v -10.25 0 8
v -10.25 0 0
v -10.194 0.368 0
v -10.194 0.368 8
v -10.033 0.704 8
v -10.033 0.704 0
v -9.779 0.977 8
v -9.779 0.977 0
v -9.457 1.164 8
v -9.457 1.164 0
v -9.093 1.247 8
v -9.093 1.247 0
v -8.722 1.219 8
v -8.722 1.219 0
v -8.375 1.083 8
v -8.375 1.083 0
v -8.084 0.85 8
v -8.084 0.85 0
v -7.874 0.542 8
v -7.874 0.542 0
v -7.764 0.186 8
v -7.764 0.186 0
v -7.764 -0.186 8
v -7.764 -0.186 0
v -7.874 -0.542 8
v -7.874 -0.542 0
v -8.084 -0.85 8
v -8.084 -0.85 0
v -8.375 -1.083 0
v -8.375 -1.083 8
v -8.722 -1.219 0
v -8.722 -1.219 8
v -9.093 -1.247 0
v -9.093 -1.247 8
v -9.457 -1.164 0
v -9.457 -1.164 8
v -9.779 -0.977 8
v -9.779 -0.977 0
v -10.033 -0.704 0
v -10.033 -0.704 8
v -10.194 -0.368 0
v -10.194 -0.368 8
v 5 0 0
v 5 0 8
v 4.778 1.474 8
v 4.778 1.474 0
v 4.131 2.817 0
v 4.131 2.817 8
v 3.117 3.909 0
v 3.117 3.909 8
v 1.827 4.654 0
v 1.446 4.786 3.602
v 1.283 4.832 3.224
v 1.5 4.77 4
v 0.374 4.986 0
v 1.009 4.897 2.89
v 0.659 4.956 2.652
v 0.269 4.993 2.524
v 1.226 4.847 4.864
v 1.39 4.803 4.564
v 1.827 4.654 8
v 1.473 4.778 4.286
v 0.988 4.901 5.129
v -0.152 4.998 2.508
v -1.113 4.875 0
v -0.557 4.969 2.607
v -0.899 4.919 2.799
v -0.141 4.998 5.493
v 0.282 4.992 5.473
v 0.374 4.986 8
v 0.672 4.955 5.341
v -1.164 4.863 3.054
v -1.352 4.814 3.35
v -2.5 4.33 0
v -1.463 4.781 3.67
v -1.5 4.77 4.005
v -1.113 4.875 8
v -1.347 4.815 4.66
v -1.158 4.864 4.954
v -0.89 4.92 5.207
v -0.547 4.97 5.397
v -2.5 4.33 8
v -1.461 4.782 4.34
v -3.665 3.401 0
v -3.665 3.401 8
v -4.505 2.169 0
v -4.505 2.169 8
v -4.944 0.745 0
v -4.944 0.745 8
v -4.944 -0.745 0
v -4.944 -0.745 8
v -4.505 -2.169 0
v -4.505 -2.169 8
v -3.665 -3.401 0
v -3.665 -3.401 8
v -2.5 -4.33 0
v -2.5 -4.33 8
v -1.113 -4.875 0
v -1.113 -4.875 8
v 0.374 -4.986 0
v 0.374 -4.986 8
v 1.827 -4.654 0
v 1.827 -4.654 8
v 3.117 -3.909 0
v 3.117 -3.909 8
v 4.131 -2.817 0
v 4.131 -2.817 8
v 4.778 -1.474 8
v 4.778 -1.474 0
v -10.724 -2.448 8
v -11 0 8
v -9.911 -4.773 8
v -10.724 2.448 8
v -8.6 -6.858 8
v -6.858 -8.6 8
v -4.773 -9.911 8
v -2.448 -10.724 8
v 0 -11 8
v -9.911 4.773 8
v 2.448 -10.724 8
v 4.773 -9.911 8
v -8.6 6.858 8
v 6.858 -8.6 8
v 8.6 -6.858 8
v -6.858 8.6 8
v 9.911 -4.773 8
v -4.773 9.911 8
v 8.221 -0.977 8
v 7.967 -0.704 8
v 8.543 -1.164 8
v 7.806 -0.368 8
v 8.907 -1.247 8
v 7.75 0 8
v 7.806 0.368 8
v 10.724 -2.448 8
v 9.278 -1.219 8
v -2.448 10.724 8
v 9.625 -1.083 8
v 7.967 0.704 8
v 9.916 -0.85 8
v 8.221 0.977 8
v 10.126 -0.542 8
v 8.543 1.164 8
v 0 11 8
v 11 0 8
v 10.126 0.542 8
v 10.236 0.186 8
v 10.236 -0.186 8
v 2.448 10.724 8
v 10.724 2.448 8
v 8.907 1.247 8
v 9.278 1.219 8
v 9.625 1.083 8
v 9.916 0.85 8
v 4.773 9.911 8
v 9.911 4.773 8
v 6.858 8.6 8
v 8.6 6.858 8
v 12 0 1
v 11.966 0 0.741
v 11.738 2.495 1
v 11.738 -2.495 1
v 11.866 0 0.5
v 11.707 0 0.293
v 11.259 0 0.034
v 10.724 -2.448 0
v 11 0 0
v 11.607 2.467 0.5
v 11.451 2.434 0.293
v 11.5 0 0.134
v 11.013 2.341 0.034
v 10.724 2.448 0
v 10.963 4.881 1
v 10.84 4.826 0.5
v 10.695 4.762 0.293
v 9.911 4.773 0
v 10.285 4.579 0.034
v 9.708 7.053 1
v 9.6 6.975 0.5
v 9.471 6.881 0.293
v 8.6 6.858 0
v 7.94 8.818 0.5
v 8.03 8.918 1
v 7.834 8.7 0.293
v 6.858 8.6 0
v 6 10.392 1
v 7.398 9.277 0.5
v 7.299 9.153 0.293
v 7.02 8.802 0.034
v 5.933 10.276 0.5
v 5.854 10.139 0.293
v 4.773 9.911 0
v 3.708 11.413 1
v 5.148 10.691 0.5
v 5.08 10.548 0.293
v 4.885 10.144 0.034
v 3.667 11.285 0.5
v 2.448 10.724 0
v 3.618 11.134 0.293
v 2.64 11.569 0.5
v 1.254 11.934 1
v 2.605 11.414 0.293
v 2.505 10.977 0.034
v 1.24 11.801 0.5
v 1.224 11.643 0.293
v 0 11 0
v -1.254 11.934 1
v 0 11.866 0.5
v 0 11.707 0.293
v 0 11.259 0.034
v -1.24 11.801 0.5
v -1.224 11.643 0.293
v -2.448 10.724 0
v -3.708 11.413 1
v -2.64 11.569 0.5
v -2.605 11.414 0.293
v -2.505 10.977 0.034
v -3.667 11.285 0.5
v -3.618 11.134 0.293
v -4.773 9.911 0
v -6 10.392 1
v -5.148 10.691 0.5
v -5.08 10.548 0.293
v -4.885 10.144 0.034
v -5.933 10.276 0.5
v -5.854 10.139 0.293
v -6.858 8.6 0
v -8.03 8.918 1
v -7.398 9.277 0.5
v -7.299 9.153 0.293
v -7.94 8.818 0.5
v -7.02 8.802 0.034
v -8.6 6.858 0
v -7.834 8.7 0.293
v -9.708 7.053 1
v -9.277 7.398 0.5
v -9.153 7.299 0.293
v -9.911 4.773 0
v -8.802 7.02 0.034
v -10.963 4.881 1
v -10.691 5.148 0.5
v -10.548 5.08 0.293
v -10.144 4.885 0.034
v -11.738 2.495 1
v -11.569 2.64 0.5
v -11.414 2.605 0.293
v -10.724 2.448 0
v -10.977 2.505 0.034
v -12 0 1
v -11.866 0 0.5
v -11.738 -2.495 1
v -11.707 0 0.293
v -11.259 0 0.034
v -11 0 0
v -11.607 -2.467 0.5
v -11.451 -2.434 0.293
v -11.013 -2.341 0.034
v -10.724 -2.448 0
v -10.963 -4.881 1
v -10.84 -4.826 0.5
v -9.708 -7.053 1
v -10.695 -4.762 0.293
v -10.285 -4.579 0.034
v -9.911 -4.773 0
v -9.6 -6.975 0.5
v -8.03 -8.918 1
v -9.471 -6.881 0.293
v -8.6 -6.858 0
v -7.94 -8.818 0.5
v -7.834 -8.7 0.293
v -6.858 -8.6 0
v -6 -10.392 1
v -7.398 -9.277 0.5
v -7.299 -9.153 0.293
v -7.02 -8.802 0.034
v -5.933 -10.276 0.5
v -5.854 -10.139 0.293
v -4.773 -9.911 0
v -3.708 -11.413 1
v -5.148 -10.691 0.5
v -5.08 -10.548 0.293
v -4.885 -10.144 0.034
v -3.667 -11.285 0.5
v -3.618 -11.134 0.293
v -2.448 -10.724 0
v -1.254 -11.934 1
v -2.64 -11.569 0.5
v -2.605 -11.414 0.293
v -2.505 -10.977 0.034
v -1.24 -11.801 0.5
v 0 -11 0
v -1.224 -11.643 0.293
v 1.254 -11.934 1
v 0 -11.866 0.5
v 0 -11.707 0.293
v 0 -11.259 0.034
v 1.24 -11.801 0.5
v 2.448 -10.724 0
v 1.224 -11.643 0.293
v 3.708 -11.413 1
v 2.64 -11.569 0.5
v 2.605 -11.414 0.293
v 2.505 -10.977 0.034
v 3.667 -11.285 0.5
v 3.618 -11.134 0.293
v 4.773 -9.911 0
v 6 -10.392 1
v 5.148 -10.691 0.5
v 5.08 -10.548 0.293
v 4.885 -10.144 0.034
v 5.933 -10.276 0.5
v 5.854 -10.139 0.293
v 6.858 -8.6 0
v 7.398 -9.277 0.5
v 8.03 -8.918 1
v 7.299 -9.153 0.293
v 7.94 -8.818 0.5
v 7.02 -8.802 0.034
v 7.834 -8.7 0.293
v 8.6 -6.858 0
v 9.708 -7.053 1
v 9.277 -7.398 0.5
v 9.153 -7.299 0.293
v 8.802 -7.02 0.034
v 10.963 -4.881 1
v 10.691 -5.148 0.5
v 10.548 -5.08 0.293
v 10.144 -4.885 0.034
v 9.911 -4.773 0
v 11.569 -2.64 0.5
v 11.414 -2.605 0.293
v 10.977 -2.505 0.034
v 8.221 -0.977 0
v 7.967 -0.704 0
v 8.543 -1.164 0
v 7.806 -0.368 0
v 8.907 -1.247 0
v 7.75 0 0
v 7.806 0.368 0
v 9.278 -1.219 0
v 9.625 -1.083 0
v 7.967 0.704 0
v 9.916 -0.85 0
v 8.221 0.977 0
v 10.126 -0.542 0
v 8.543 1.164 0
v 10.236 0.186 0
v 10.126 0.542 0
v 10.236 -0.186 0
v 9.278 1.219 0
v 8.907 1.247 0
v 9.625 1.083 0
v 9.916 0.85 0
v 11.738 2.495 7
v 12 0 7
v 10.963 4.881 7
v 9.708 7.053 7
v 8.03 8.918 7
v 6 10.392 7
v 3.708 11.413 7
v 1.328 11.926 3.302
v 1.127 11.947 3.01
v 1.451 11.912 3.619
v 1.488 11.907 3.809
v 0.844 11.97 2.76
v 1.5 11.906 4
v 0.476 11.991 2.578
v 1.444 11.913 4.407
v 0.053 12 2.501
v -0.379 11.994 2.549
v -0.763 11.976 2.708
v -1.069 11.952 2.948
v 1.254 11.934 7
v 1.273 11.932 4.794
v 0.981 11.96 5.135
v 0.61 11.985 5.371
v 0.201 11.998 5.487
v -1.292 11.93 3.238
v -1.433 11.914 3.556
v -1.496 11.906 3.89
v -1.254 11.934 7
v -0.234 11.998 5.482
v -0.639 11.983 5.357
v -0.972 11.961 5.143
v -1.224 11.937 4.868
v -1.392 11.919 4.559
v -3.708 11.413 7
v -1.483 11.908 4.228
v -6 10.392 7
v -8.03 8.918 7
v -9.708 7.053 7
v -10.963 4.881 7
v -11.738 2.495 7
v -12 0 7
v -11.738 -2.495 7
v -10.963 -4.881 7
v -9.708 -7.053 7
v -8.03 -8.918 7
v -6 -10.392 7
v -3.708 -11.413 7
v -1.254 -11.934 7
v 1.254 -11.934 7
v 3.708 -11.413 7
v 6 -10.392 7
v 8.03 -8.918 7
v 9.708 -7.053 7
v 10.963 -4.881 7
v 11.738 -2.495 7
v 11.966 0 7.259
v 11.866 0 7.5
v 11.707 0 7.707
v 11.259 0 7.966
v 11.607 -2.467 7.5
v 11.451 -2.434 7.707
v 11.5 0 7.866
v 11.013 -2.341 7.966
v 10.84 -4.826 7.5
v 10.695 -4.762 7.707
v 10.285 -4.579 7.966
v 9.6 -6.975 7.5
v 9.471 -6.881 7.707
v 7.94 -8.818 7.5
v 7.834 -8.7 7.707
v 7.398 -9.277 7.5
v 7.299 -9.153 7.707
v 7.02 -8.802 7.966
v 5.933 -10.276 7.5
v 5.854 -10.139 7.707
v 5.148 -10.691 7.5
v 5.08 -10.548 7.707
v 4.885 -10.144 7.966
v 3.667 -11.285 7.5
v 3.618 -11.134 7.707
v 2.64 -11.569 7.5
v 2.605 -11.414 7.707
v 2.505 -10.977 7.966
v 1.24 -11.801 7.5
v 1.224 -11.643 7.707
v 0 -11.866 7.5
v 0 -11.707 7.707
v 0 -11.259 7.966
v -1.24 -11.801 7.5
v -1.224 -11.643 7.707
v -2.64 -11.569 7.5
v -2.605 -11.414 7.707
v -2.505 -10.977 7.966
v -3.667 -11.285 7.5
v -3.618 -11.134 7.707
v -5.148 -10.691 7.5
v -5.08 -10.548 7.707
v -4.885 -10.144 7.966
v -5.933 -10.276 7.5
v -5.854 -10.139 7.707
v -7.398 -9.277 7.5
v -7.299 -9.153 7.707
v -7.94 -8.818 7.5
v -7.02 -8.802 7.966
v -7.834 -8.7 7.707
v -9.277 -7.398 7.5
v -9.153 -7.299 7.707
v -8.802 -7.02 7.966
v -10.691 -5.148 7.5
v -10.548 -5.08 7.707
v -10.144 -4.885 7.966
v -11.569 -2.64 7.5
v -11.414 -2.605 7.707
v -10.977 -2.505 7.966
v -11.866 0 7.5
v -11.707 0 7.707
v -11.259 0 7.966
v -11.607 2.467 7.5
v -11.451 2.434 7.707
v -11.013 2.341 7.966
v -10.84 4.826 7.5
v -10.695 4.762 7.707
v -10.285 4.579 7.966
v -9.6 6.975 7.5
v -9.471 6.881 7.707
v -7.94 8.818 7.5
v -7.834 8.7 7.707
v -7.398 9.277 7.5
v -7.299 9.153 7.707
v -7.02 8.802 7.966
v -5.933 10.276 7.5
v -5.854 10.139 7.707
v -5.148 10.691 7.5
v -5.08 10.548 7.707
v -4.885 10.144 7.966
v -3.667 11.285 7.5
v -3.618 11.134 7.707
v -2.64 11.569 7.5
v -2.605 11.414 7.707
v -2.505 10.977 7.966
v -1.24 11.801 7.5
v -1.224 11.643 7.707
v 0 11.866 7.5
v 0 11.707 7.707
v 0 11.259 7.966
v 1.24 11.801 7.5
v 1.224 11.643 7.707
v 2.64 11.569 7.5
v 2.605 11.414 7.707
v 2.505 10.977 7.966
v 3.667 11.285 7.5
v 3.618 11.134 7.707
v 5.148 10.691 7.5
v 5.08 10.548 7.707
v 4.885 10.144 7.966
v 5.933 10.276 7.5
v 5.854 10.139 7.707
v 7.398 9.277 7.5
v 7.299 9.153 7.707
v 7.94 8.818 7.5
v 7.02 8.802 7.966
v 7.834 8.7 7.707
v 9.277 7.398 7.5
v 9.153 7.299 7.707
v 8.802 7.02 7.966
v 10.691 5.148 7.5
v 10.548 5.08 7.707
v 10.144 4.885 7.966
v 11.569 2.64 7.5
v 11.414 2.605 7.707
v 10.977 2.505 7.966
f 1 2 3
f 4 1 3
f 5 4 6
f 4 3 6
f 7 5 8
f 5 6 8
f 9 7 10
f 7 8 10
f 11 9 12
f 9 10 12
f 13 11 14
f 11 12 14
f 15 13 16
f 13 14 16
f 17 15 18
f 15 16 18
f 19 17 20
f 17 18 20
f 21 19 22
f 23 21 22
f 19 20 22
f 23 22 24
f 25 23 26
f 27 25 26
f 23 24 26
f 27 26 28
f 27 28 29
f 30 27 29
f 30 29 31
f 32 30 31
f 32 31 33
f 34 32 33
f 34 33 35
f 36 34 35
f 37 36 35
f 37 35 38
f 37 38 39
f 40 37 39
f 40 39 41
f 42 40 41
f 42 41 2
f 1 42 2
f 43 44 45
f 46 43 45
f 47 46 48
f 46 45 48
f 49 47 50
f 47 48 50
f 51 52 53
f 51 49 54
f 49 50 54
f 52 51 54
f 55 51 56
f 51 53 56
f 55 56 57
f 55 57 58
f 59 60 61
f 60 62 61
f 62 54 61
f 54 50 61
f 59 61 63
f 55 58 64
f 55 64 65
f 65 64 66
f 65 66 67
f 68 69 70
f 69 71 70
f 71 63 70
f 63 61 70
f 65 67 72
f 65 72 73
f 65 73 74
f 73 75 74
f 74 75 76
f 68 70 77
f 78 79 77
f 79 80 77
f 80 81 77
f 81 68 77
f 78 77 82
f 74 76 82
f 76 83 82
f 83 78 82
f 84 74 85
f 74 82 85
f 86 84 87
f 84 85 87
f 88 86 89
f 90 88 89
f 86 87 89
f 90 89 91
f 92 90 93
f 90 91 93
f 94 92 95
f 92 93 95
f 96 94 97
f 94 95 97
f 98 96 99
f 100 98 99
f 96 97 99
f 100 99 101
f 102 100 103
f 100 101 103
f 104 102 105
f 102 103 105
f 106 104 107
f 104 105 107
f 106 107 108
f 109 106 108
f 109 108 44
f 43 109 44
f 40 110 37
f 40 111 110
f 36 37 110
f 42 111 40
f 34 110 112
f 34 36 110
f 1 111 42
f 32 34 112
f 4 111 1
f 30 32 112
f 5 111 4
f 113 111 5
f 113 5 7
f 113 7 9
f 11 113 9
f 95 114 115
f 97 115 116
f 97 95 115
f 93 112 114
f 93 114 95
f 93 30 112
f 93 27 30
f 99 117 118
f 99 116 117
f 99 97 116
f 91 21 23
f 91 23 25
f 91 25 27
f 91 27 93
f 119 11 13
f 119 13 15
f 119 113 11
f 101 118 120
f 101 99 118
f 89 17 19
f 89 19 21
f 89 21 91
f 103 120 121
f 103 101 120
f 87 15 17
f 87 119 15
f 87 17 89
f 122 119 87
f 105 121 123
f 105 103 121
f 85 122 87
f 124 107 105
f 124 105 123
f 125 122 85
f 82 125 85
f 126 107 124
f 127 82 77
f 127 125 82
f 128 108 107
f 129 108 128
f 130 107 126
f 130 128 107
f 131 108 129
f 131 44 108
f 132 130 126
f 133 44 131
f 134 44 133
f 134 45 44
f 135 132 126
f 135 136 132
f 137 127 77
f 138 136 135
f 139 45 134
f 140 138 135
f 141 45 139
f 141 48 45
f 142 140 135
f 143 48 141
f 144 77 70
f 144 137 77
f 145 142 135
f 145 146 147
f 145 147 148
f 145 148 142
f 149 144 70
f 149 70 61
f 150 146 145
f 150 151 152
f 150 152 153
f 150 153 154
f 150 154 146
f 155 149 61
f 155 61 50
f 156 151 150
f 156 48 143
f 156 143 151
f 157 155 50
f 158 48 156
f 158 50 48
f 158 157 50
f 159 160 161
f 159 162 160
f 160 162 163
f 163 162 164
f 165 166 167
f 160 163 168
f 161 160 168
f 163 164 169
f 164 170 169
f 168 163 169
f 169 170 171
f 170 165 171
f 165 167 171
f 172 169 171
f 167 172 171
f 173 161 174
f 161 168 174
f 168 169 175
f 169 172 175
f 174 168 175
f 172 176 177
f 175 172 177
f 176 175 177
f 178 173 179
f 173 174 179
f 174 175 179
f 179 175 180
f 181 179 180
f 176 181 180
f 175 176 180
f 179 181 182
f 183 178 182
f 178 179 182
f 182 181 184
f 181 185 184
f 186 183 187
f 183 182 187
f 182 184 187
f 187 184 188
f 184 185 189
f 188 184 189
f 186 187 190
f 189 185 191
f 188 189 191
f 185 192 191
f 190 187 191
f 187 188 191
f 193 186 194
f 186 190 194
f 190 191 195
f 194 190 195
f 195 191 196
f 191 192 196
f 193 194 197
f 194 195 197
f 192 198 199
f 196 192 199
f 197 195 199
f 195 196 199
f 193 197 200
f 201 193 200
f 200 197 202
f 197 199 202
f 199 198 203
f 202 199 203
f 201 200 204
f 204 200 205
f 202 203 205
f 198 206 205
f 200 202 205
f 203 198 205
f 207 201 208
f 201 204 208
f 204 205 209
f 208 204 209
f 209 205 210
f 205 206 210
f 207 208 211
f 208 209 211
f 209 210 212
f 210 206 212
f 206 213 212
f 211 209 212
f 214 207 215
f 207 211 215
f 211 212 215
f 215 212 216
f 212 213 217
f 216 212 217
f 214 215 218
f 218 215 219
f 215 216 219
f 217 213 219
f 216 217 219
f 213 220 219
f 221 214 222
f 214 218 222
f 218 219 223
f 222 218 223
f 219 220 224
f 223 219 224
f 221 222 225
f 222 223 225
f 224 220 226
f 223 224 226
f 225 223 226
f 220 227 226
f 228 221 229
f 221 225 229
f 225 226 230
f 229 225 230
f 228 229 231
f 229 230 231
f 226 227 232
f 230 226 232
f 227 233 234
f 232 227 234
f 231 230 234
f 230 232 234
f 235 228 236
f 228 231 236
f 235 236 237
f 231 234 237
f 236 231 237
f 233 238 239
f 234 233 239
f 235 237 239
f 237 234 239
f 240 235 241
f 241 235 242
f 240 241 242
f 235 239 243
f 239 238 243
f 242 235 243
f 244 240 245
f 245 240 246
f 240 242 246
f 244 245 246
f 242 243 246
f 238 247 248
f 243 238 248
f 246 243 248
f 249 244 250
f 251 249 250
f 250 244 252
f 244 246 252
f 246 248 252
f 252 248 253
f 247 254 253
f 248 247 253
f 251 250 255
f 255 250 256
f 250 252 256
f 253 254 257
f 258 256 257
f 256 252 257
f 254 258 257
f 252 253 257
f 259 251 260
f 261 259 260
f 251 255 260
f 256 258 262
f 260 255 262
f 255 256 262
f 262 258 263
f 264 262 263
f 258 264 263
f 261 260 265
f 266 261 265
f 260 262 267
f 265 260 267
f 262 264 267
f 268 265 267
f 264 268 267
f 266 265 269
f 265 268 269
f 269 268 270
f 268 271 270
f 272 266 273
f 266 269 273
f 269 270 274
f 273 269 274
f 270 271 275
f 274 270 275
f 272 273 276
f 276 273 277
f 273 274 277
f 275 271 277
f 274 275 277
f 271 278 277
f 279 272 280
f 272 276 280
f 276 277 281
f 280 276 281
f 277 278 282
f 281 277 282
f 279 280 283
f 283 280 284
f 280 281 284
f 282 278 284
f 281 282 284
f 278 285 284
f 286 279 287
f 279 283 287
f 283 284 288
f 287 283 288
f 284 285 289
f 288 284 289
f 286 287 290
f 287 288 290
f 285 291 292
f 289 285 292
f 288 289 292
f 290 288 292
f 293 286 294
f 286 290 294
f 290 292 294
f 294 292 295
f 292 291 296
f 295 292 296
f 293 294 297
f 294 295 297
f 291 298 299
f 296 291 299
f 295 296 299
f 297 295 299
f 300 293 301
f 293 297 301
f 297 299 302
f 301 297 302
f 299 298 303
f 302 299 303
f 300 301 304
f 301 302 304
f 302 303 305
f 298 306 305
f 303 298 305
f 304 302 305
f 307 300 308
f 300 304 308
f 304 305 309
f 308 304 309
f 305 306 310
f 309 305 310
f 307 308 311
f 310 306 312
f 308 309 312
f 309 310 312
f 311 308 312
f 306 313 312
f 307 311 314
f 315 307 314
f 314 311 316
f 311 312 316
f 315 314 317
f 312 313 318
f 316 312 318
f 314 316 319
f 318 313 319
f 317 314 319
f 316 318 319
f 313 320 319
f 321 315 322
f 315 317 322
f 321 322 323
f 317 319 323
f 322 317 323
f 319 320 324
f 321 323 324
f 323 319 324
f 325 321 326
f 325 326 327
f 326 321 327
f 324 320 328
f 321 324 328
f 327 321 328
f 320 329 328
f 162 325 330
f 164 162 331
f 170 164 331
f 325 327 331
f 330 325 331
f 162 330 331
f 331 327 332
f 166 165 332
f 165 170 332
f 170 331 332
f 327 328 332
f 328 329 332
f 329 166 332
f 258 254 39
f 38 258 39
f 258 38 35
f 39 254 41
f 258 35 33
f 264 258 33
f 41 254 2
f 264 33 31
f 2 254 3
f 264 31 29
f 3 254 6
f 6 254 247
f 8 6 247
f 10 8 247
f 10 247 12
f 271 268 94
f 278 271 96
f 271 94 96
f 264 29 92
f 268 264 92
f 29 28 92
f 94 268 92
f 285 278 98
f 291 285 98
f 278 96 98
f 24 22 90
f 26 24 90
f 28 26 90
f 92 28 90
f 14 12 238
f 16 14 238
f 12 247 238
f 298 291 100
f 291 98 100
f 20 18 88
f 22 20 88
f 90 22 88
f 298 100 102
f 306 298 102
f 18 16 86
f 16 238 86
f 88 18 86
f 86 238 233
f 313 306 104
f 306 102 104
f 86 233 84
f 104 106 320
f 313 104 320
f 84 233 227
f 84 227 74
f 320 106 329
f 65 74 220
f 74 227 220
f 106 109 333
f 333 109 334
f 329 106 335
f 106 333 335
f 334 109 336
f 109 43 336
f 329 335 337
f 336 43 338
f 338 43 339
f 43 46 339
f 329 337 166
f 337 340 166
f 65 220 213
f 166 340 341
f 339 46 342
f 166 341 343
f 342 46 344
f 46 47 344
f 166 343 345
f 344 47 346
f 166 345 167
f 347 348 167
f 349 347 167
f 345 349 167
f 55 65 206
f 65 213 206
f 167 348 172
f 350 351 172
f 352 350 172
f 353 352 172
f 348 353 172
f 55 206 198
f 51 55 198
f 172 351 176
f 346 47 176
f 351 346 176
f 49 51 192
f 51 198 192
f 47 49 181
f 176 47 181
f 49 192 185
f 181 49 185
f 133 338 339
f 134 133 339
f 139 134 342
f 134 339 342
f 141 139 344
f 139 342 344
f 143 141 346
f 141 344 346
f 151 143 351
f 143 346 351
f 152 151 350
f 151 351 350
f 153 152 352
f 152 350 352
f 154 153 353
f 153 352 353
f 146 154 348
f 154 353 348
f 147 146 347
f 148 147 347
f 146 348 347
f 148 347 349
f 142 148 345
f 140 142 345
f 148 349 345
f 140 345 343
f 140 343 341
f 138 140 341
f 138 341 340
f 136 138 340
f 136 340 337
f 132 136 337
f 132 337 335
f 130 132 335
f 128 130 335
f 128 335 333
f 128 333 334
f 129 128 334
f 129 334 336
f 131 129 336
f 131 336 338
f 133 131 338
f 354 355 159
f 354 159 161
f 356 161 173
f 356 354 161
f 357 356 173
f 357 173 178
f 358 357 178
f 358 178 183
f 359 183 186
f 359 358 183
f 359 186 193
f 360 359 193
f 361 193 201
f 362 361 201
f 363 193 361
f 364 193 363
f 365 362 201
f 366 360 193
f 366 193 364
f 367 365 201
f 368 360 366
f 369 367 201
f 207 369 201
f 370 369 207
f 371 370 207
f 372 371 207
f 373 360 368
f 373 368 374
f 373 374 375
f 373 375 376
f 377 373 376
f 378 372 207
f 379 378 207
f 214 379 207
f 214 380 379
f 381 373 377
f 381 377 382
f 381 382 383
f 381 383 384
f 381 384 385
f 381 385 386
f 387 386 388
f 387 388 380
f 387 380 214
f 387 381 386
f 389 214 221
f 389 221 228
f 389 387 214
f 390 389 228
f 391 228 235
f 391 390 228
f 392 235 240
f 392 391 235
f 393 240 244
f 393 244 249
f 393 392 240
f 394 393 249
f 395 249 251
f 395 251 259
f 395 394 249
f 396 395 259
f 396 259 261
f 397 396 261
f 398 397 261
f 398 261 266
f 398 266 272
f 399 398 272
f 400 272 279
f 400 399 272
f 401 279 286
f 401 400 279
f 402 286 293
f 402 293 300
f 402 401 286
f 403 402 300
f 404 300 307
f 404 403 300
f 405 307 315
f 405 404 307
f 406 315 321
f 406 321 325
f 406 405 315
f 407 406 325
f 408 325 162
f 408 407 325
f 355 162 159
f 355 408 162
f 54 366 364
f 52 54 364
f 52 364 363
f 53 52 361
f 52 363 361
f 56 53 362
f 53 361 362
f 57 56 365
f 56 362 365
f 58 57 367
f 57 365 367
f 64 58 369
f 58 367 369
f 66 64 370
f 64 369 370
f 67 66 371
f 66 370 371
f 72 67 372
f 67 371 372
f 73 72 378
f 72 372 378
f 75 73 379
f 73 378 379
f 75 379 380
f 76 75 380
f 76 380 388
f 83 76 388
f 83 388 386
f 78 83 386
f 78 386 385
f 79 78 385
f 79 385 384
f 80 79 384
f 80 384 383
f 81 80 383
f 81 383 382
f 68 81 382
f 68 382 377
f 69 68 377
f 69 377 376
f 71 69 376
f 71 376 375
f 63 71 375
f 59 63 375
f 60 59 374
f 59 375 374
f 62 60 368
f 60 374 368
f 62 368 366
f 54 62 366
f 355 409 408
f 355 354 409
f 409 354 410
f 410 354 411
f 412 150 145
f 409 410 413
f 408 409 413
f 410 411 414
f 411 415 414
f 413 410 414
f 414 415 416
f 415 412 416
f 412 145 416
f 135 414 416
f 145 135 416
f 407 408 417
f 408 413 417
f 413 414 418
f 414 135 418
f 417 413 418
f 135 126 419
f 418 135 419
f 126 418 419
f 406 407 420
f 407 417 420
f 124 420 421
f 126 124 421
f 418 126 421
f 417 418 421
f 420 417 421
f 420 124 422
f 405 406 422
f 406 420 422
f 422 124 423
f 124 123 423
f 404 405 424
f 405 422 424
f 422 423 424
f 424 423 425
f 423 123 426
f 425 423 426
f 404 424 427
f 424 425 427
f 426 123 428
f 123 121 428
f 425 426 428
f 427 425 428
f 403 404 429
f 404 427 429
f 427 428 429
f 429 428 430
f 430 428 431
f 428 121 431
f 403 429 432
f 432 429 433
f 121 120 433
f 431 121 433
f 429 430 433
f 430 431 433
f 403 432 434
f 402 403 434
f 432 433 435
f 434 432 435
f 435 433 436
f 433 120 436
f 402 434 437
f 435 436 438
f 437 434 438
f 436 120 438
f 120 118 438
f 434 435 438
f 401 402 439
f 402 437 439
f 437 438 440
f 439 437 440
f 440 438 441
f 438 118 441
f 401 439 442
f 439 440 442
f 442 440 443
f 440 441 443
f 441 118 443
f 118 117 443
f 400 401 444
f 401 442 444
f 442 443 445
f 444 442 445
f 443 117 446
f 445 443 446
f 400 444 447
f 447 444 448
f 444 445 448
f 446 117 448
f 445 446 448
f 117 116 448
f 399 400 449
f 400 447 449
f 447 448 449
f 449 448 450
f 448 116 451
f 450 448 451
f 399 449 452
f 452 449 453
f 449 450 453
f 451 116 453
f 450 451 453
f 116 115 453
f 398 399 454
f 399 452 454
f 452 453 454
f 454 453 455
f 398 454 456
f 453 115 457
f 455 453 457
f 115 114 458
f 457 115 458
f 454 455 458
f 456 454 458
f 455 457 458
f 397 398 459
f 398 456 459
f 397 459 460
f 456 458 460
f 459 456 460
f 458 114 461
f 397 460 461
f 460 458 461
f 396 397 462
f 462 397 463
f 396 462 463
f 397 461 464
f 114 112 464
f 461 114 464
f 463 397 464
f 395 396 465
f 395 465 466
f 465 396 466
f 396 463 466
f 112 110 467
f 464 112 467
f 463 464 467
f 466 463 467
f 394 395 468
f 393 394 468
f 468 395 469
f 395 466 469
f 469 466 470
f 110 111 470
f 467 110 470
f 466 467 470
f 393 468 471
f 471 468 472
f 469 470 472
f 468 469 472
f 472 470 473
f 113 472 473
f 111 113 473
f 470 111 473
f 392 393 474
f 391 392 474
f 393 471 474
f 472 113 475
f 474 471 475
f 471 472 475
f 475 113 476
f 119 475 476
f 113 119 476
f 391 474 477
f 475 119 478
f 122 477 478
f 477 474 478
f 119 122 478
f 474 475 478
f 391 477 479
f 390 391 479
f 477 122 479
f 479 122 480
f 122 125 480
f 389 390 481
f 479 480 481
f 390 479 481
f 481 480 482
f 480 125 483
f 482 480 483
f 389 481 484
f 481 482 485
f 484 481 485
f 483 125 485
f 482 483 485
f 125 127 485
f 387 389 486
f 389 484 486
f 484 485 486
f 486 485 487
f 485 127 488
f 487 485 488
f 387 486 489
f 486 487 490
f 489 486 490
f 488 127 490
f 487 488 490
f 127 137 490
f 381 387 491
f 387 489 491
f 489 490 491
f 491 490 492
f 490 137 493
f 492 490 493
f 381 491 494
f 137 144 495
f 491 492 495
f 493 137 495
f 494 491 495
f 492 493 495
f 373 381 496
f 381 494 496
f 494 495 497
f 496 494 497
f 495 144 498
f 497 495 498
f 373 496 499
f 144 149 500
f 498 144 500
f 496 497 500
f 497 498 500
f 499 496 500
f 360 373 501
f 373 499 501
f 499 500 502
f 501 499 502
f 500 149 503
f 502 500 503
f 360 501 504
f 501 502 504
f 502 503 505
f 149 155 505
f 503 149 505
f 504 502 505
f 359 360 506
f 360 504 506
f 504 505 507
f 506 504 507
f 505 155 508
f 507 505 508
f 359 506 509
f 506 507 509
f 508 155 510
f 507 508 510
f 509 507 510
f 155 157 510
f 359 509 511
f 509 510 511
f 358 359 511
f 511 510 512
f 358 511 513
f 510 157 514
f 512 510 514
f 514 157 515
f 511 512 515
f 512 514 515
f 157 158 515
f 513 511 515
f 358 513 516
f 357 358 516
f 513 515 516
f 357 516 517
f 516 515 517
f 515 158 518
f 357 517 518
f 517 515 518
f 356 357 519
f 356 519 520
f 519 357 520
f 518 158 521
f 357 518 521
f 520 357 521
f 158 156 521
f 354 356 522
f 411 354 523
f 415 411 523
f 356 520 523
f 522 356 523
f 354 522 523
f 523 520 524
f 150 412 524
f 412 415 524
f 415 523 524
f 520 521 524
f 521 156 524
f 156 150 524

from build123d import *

# Parameters (mm, degrees)
SKETCH1_W                  = 24
SKETCH1_H                  = 24
BOSS_EXTRUDE1_DEPTH        = 8
M3_TAPPED_HOLE1_D          = 2.5
F_10_0_10_DIAMETER_HOLE1_D = 10
F_3_0MM_DOWEL_HOLE1_REACH  = 30
F_3_0MM_DOWEL_HOLE1_BORE_R = 1.5
SKETCH15_R                 = 16.970562748
SKETCH15_R_2               = 12
CUT_EXTRUDE1_DEPTH         = 10
FILLET1_R                  = 1


with BuildPart() as part:
    # Sketch1 → Boss-Extrude1 (new body)
    with BuildSketch(Plane.XY):
        Rectangle(SKETCH1_W, SKETCH1_H)
    extrude(amount=BOSS_EXTRUDE1_DEPTH)

    # M3 Tapped Hole1 (through all)
    with Locations(Plane.XY.offset(8)):
        with Locations((9, 0), (-9, 0)):
            Hole(M3_TAPPED_HOLE1_D / 2)

    # Ø10.0 (10) Diameter Hole1 (through all)
    with Locations(Plane(origin=(0, 0, 0), x_dir=(-1, 0, 0), z_dir=(0, 0, -1))):
        with Locations((0, 0)):
            Hole(F_10_0_10_DIAMETER_HOLE1_D / 2)

    # Ø3.0mm Dowel Hole1 bore → Ø3.0mm Dowel Hole1 (cut, up to next)
    with BuildSketch(Plane(origin=(0, 12, 0), x_dir=(1, 0, 0), z_dir=(0, 1, 0)), mode=Mode.PRIVATE) as f_3_0mm_dowel_hole1_sk1:
        with Locations((0, -4)):
            Circle(F_3_0MM_DOWEL_HOLE1_BORE_R)
    f_3_0mm_dowel_hole1_tool1 = extrude(f_3_0mm_dowel_hole1_sk1.sketch, amount=-F_3_0MM_DOWEL_HOLE1_REACH, mode=Mode.PRIVATE) & part.part
    add(f_3_0mm_dowel_hole1_tool1.solids().sort_by_distance((0, 12, 4))[0], mode=Mode.SUBTRACT)

    # Sketch15 → Cut-Extrude1 (cut)
    with BuildSketch(Plane.XY.offset(8)):
        Circle(SKETCH15_R)
        Circle(SKETCH15_R_2, mode=Mode.SUBTRACT)
    extrude(amount=-CUT_EXTRUDE1_DEPTH, mode=Mode.SUBTRACT)

    # Fillet1
    fillet1_edges = [part.edges().sort_by_distance(p)[0] for p in [
        (-12, 0, 0),
        (-12, 0, 8),
    ]]
    fillet(fillet1_edges, radius=FILLET1_R)


solid = part.part
